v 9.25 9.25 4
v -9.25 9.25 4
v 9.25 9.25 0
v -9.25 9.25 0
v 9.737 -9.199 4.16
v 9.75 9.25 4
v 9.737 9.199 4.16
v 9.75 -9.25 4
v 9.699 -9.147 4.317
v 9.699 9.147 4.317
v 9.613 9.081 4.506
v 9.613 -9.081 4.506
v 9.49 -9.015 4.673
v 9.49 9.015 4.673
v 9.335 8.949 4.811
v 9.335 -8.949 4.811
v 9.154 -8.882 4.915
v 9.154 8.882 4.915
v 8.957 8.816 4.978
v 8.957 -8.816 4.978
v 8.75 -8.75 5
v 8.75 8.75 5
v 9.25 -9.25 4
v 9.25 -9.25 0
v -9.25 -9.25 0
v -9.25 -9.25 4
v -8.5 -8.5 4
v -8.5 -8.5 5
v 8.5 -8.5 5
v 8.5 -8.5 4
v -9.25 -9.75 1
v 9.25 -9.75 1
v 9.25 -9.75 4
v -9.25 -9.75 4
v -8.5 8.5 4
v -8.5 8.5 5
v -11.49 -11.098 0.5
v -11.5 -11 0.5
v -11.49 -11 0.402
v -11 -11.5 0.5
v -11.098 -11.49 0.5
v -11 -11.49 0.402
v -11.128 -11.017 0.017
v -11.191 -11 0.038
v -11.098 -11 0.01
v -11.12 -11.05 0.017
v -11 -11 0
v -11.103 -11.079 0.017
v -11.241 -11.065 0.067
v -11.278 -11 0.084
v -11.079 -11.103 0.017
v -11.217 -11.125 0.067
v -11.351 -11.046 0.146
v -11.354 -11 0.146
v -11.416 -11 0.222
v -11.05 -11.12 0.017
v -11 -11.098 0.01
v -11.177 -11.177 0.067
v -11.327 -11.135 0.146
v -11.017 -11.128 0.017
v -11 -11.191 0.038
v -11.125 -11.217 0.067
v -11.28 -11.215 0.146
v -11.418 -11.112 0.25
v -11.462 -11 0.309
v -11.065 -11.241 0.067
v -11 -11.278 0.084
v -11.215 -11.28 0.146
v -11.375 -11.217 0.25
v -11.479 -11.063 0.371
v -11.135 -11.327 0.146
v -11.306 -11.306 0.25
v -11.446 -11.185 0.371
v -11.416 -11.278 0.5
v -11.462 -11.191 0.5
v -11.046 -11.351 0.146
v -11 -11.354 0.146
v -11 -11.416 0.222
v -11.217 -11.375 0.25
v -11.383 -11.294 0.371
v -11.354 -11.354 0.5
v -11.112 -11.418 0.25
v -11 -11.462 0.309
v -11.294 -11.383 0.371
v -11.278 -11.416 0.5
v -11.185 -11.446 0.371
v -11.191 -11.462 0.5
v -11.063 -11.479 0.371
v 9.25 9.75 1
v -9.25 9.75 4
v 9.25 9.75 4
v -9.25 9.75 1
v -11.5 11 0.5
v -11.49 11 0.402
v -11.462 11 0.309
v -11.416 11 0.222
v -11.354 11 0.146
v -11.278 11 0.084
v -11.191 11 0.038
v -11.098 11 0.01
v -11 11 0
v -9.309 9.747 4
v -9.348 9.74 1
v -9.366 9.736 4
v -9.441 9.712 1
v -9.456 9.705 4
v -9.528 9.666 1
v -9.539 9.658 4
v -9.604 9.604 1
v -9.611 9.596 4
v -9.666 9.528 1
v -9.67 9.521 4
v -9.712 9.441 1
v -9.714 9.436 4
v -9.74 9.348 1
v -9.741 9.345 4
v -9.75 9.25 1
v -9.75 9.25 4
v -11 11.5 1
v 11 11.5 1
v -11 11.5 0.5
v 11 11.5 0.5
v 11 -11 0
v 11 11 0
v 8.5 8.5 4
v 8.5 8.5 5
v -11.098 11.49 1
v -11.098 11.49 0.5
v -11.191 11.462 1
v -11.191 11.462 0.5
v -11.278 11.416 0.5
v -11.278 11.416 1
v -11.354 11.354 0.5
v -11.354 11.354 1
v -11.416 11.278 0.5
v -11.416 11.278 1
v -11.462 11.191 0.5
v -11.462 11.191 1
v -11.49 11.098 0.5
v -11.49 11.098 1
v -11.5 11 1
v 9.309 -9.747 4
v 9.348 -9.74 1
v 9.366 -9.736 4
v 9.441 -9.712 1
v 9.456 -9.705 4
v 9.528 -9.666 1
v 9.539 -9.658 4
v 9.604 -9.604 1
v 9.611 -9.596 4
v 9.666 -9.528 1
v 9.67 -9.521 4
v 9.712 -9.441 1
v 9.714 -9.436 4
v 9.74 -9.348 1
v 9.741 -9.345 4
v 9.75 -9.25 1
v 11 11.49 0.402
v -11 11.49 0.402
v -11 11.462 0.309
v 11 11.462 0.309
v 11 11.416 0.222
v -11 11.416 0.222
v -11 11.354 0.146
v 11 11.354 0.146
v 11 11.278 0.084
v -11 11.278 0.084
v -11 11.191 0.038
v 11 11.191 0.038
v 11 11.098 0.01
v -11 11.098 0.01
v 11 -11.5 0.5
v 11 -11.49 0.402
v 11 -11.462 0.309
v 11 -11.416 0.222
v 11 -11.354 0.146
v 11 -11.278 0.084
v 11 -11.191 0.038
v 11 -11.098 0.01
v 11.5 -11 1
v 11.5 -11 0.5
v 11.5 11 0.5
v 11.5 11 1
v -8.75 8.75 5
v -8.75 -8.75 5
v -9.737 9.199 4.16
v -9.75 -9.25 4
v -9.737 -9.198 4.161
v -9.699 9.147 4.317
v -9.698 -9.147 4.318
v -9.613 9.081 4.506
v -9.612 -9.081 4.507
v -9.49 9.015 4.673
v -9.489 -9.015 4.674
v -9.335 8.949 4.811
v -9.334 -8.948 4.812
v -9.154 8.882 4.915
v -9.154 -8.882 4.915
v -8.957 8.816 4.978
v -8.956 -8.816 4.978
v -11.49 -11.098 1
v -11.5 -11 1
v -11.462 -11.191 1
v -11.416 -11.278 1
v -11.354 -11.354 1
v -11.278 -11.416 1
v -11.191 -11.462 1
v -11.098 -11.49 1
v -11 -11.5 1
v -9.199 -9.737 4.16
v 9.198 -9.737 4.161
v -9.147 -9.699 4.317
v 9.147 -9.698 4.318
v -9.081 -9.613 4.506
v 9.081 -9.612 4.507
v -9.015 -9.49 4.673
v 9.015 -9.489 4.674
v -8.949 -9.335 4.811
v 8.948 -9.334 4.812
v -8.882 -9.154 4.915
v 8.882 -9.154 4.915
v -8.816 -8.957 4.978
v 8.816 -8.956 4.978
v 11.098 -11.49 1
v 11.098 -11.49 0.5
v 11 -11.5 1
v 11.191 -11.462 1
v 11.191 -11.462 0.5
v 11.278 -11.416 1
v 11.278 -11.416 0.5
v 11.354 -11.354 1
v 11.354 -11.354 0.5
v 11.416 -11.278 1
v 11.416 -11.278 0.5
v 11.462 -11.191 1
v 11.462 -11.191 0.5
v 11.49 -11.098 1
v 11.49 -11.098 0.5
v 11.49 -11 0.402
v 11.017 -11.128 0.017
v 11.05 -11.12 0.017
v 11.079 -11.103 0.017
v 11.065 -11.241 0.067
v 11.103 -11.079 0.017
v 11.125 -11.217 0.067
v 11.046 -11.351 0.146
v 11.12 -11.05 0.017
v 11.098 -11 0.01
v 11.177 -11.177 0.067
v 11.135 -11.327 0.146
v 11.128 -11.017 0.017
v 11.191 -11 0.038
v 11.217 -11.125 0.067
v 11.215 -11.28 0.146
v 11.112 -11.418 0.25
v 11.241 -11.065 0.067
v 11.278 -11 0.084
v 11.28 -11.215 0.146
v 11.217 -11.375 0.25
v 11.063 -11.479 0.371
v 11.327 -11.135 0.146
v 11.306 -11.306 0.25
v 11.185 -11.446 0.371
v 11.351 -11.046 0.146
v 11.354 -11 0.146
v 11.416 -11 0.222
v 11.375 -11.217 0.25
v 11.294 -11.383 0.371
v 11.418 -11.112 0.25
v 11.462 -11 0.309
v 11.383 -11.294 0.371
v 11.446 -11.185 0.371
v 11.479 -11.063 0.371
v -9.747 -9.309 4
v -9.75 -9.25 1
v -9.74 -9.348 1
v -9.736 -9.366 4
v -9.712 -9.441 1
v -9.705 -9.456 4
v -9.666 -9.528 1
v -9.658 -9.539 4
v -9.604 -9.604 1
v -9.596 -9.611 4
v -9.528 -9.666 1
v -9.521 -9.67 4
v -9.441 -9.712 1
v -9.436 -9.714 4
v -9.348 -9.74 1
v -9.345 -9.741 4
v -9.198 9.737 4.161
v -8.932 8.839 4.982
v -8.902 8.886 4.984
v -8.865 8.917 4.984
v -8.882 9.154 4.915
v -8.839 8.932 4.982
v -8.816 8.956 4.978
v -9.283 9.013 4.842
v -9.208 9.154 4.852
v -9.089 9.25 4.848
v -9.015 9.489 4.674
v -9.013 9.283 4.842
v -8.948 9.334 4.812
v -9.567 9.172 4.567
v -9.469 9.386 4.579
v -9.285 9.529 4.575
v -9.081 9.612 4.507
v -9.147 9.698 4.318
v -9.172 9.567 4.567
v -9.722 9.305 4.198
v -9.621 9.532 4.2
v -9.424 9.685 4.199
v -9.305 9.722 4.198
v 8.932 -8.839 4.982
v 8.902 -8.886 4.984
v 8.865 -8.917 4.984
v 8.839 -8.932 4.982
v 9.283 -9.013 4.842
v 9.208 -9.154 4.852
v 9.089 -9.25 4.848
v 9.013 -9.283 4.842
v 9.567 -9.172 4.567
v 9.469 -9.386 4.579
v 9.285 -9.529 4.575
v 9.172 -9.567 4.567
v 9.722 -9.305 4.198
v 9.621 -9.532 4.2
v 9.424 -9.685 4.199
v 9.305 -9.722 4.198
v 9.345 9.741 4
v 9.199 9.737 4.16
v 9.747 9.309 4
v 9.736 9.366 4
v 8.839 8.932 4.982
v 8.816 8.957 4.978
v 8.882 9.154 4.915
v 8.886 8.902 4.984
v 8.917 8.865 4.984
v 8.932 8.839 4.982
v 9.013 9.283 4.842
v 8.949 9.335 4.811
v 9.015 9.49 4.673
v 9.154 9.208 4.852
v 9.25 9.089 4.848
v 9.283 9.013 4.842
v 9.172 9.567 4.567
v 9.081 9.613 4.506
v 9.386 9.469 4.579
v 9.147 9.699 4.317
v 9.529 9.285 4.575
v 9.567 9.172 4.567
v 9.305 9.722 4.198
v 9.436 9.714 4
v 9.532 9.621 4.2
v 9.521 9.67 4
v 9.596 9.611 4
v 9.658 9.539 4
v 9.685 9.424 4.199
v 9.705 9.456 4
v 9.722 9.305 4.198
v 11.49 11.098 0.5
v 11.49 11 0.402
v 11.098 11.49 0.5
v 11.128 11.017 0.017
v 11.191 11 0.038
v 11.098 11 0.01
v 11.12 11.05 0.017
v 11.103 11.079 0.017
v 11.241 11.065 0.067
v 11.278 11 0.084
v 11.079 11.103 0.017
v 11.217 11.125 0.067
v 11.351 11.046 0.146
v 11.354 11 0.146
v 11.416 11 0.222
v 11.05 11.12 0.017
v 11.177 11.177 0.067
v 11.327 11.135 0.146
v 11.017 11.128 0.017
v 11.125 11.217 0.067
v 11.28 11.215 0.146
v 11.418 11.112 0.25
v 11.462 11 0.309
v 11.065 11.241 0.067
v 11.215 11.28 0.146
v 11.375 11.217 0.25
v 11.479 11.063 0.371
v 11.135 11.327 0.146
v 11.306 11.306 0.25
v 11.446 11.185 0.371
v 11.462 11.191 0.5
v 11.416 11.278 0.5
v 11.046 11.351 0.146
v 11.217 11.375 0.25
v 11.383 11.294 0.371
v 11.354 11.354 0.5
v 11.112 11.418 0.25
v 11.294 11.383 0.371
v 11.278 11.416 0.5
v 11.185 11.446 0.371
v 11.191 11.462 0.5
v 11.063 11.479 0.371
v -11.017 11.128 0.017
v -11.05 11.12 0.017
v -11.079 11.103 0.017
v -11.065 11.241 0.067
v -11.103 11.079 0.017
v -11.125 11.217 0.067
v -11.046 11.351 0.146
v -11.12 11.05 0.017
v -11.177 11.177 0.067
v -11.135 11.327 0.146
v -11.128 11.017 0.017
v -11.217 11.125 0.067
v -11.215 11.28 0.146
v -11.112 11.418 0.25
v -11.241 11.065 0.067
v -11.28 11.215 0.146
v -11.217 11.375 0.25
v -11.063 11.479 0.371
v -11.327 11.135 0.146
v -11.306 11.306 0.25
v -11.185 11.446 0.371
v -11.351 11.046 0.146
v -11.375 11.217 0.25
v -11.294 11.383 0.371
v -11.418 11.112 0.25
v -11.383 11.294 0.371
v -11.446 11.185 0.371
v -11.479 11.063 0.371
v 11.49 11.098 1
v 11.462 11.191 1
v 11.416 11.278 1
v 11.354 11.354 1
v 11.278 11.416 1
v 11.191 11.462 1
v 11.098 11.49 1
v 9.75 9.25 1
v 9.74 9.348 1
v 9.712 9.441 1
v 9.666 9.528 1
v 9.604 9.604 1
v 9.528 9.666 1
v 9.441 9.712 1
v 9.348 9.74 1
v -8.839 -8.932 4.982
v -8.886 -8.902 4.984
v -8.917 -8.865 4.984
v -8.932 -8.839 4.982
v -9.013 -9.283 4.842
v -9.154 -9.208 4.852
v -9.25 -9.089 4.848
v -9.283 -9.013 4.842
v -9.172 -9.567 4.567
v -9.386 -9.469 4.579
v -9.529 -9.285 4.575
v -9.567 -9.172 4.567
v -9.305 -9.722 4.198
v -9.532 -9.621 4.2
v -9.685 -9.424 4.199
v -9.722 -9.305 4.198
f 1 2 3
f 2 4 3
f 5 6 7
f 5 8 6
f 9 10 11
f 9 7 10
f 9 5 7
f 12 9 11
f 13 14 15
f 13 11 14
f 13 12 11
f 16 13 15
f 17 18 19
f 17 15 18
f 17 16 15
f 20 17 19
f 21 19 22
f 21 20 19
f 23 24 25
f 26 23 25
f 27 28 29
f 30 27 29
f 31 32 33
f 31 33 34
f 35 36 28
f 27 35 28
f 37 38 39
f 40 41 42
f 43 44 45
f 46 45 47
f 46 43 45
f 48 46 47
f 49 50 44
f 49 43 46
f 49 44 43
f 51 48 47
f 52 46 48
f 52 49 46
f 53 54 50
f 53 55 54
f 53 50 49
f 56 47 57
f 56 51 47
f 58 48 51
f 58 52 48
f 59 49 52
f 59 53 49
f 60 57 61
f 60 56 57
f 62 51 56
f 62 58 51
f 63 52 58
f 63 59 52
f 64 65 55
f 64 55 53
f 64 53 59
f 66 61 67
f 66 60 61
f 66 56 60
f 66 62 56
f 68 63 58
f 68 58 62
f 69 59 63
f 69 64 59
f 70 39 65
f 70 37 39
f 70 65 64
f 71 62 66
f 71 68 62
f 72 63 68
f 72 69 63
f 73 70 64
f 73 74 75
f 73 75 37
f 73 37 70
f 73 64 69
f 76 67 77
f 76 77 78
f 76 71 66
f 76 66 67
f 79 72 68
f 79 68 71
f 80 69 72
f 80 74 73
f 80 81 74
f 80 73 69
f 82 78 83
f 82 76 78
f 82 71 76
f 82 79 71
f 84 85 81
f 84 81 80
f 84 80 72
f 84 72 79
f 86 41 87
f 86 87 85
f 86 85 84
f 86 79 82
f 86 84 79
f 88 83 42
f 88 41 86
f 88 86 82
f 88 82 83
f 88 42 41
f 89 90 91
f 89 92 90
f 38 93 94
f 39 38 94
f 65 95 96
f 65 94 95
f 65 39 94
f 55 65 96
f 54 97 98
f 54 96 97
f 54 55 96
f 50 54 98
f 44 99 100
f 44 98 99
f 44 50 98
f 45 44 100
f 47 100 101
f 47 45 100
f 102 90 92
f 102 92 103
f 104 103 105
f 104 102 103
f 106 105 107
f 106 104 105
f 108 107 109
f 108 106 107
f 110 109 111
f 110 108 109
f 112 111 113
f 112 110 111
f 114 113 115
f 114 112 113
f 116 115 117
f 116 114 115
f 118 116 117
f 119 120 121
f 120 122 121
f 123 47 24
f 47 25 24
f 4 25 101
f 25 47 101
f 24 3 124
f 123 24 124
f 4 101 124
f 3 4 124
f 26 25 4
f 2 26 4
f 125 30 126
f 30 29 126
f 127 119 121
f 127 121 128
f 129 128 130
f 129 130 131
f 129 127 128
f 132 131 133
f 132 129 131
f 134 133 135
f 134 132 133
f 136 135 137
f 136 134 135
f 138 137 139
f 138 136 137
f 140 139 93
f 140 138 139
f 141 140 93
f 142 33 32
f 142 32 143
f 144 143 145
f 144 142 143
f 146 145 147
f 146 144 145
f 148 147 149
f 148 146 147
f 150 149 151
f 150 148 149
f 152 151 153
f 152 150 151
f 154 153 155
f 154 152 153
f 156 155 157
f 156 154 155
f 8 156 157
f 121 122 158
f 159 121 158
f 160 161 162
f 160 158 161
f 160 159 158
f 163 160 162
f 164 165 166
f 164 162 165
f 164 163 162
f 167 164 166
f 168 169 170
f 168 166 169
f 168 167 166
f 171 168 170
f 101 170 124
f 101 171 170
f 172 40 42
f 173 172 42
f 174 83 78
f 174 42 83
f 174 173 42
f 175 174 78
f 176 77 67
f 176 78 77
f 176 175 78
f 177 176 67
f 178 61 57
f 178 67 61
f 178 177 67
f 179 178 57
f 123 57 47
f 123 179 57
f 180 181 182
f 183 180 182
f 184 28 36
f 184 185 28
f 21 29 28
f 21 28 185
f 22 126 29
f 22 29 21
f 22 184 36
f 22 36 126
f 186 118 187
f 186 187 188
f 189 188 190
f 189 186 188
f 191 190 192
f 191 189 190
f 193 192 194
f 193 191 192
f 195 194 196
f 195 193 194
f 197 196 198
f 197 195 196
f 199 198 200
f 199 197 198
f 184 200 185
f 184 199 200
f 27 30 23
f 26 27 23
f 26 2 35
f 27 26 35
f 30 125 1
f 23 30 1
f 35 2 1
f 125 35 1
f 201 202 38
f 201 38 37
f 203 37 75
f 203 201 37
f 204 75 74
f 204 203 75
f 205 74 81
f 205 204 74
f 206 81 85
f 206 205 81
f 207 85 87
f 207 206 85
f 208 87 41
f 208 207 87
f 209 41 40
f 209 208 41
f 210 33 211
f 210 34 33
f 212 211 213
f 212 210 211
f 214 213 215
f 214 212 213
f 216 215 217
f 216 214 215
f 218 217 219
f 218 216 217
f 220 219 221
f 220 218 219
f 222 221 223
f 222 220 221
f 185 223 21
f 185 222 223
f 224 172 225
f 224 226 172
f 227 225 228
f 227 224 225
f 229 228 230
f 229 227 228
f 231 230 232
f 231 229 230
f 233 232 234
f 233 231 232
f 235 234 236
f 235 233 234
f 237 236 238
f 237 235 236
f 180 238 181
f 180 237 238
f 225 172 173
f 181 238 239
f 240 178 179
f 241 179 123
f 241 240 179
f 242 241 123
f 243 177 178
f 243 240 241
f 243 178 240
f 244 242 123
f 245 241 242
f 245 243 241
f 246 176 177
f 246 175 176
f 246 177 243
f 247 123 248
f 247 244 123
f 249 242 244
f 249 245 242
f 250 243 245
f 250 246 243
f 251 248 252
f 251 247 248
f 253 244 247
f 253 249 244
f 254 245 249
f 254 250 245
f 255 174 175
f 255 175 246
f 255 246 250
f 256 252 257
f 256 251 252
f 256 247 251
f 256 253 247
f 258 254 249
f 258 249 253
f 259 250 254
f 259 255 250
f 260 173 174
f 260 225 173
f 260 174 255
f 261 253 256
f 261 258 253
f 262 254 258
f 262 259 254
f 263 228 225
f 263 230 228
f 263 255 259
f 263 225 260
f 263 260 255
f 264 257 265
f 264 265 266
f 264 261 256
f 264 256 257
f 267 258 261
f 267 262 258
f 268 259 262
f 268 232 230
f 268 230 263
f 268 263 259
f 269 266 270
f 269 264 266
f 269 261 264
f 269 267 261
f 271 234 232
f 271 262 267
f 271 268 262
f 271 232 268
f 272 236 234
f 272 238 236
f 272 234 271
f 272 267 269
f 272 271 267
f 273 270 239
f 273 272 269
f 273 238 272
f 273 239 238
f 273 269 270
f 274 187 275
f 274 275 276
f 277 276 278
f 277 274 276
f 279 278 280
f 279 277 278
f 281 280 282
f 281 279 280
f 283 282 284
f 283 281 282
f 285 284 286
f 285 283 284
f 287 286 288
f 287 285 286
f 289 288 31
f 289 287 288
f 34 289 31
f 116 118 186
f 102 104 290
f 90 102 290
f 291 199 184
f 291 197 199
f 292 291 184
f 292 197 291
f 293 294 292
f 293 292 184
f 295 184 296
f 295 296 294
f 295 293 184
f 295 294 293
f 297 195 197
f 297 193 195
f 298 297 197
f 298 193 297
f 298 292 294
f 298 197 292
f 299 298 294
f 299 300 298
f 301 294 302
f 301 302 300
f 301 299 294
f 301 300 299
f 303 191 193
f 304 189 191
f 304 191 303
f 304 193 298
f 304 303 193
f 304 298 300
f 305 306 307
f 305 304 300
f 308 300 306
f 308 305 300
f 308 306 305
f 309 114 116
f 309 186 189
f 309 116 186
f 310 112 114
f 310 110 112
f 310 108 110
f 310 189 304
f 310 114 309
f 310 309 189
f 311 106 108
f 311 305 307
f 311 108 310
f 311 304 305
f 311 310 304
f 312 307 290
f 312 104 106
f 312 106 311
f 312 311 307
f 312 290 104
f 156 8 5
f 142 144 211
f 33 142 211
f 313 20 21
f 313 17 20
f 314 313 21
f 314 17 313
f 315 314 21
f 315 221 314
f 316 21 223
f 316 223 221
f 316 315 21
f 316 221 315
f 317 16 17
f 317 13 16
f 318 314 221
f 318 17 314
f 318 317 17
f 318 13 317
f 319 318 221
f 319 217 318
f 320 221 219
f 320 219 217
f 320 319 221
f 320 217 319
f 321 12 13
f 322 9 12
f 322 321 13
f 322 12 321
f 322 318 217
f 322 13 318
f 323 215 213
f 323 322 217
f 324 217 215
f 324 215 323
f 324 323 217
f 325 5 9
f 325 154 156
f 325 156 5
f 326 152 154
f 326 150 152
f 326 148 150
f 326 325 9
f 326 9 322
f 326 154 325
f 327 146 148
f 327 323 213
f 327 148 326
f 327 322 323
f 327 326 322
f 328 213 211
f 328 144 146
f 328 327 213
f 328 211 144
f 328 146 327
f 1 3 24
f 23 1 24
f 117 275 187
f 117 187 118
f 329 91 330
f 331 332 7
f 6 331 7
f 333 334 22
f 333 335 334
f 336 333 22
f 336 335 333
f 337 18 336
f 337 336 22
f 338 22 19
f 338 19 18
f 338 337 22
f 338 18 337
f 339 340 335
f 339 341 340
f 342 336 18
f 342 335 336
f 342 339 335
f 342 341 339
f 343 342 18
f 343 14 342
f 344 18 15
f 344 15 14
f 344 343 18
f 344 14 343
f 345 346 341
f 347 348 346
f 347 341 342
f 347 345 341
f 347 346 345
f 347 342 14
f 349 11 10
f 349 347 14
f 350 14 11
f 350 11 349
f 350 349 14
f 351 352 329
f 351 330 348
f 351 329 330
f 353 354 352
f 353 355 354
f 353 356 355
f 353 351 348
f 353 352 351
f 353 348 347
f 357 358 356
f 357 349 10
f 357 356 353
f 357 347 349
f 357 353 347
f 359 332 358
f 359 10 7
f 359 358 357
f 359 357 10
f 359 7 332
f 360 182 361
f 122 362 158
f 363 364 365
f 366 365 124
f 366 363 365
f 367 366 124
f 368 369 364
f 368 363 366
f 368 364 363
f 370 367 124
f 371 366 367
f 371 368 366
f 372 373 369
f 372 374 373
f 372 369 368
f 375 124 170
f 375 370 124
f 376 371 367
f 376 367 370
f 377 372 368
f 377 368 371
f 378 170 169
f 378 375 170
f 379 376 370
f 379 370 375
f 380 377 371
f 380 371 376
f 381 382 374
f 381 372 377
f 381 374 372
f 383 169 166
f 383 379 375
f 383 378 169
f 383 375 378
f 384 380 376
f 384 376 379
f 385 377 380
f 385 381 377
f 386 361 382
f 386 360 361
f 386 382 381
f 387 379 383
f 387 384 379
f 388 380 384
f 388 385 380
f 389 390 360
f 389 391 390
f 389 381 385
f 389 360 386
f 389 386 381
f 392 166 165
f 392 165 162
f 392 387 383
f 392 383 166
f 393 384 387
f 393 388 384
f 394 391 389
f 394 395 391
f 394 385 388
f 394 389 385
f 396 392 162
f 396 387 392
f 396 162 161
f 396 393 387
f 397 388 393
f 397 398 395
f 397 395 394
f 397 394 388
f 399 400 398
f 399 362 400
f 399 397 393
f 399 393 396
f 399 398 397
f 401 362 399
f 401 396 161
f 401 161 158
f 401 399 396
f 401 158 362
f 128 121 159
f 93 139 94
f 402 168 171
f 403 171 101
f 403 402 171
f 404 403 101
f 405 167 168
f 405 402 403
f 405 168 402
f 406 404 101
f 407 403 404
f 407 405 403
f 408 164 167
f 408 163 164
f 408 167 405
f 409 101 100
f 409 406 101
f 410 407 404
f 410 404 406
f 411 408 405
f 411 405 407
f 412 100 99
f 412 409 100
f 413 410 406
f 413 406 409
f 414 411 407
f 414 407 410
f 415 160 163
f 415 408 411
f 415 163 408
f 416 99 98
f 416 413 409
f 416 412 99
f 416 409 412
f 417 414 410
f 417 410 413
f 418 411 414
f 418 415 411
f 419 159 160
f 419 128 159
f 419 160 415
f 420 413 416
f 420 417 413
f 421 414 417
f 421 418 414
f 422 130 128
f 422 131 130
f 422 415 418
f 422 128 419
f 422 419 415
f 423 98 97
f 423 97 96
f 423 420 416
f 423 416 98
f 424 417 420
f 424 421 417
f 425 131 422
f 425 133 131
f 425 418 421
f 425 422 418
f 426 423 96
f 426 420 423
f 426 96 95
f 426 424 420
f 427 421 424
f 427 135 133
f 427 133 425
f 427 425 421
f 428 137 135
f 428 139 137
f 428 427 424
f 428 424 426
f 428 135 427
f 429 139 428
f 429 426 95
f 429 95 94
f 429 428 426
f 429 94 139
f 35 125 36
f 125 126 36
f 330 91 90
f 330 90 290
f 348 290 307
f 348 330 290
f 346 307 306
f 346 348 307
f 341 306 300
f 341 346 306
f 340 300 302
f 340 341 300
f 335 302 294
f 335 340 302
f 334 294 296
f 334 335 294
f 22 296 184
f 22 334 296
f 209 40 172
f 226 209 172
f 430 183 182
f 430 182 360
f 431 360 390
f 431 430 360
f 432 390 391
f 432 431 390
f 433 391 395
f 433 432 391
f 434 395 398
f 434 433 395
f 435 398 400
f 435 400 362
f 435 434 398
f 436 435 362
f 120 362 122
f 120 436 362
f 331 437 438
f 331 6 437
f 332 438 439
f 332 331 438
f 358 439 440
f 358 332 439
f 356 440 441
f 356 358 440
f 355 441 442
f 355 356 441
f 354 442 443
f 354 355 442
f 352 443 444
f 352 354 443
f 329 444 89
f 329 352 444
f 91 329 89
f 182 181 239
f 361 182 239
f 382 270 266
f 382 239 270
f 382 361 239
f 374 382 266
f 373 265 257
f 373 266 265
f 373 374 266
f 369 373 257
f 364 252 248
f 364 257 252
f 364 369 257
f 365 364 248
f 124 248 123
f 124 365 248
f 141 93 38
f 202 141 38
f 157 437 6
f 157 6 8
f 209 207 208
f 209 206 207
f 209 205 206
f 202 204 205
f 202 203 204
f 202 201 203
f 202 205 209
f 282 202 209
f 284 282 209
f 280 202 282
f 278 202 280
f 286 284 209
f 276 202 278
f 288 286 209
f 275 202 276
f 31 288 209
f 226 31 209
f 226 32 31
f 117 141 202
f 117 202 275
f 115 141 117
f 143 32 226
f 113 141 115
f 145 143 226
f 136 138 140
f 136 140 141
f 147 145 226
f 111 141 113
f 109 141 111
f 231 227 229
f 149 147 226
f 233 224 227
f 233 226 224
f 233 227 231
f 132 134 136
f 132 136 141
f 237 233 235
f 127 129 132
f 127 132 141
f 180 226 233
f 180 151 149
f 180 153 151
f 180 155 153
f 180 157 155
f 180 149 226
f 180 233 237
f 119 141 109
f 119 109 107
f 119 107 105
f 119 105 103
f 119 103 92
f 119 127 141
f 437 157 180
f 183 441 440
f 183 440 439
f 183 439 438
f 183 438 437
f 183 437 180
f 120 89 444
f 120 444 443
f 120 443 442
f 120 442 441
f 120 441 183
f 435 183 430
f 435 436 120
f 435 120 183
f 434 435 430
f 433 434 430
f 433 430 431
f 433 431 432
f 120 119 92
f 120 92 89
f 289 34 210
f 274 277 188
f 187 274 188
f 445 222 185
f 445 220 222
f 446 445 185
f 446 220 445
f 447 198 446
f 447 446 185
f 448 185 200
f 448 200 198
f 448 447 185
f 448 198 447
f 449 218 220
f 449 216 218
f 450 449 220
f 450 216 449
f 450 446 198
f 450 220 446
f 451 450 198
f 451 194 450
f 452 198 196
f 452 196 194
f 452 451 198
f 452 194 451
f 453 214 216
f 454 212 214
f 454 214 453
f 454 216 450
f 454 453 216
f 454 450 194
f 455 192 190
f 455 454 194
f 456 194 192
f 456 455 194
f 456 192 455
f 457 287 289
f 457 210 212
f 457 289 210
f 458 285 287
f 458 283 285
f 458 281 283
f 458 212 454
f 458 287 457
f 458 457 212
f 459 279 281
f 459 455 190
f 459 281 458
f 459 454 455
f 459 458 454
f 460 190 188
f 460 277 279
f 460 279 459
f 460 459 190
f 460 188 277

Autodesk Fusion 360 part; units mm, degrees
sketch "Sketch1" plane through (0, 0, 0) normal (0, 0, 1) x (1, 0, 0)
  line L0 (9.75, -9.75) -> (-9.75, -9.75)
  line L1 (-9.75, -9.75) -> (-9.75, 9.75)
  line L2 (-9.75, 9.75) -> (9.75, 9.75)
  line L3 (9.75, 9.75) -> (9.75, -9.75)
  line L4 (9.75, -9.75) -> (-9.75, 9.75) construction
  line L5 (-9.75, -9.75) -> (9.75, 9.75) construction
  line L6 (11.5, 11.5) -> (-11.5, 11.5)
  line L7 (-11.5, 11.5) -> (-11.5, -11.5)
  line L8 (-11.5, -11.5) -> (11.5, -11.5)
  line L9 (11.5, -11.5) -> (11.5, 11.5)
  line L10 (11.5, 11.5) -> (-11.5, -11.5) construction
  line L11 (-11.5, 11.5) -> (11.5, -11.5) construction
  line L12 (9.25, -9.25) -> (-9.25, -9.25)
  line L13 (-9.25, -9.25) -> (-9.25, 9.25)
  line L14 (-9.25, 9.25) -> (9.25, 9.25)
  line L15 (9.25, 9.25) -> (9.25, -9.25)
  line L16 (9.25, -9.25) -> (-9.25, 9.25) construction
  line L17 (-9.25, -9.25) -> (9.25, 9.25) construction
  dimension "d1" = 19.5
  dimension "d2" = 19.5
  dimension "d3" = 23
  dimension "d4" = 23
  dimension "d5" = 18.5
  dimension "d6" = 18.5
extrude "Extrude1" add sketch "Sketch1" along normal blind 1 contours L0 L1 L2 L3 | L6 L7 L8 L9 makes body 1
extrude "Extrude2" add sketch "Sketch1" along normal blind 5 contours L12 L13 L14 L15 bodies 1
sketch "Sketch2" plane through (0, 0, 5) normal (0, 0, 1) x (-1, 0, 0)
  line L0 (-9.25, -9.25) -> (9.25, -9.25)
  line L1 (9.25, -9.25) -> (9.25, 9.25)
  line L2 (9.25, 9.25) -> (-9.25, 9.25)
  line L3 (-9.25, 9.25) -> (-9.25, -9.25)
  line L4 (8.5, 8.5) -> (-8.5, 8.5)
  line L5 (-8.5, 8.5) -> (-8.5, -8.5)
  line L6 (-8.5, -8.5) -> (8.5, -8.5)
  line L7 (8.5, -8.5) -> (8.5, 8.5)
  line L8 (8.5, 8.5) -> (-8.5, -8.5) construction
  line L9 (-8.5, 8.5) -> (8.5, -8.5) construction
  dimension "d11" = 17
  dimension "d12" = 17
extrude "Extrude3" cut sketch "Sketch2" against normal blind 10 contours L4 L5 L6 L7 bodies 1
extrude "Extrude4" cut sketch "Sketch1" along normal blind 4 contours L12 L13 L14 L15 bodies 1 makes body 2 at (-2.8333, 9, 4)
extrude "Extrude5" add sketch "Sketch1" along normal blind 5 contours L0 L1 L2 L3 bodies 1 2
fillet "Fillet1" radius 0.5 12 edges at (-9.75, -9.75, 3) (-9.75, 9.75, 3) (9.75, 9.75, 3) (9.75, -9.75, 3) (11.5, 11.5, 0.5) (-11.5, 11.5, 0.5) (11.5, -11.5, 0.5) (-11.5, -11.5, 0.5) (0, -11.5, 0) (11.5, 0, 0) (0, 11.5, 0) (-11.5, 0, 0) on bodies 1
fillet "Fillet2" radius 1 8 edges at (9.6036, 9.6036, 5) (0, 9.75, 5) (-9.6036, 9.6036, 5) (-9.75, 0, 5) (-9.6036, -9.6036, 5) (0, -9.75, 5) (9.6036, -9.6036, 5) (9.75, 0, 5) on bodies 1
